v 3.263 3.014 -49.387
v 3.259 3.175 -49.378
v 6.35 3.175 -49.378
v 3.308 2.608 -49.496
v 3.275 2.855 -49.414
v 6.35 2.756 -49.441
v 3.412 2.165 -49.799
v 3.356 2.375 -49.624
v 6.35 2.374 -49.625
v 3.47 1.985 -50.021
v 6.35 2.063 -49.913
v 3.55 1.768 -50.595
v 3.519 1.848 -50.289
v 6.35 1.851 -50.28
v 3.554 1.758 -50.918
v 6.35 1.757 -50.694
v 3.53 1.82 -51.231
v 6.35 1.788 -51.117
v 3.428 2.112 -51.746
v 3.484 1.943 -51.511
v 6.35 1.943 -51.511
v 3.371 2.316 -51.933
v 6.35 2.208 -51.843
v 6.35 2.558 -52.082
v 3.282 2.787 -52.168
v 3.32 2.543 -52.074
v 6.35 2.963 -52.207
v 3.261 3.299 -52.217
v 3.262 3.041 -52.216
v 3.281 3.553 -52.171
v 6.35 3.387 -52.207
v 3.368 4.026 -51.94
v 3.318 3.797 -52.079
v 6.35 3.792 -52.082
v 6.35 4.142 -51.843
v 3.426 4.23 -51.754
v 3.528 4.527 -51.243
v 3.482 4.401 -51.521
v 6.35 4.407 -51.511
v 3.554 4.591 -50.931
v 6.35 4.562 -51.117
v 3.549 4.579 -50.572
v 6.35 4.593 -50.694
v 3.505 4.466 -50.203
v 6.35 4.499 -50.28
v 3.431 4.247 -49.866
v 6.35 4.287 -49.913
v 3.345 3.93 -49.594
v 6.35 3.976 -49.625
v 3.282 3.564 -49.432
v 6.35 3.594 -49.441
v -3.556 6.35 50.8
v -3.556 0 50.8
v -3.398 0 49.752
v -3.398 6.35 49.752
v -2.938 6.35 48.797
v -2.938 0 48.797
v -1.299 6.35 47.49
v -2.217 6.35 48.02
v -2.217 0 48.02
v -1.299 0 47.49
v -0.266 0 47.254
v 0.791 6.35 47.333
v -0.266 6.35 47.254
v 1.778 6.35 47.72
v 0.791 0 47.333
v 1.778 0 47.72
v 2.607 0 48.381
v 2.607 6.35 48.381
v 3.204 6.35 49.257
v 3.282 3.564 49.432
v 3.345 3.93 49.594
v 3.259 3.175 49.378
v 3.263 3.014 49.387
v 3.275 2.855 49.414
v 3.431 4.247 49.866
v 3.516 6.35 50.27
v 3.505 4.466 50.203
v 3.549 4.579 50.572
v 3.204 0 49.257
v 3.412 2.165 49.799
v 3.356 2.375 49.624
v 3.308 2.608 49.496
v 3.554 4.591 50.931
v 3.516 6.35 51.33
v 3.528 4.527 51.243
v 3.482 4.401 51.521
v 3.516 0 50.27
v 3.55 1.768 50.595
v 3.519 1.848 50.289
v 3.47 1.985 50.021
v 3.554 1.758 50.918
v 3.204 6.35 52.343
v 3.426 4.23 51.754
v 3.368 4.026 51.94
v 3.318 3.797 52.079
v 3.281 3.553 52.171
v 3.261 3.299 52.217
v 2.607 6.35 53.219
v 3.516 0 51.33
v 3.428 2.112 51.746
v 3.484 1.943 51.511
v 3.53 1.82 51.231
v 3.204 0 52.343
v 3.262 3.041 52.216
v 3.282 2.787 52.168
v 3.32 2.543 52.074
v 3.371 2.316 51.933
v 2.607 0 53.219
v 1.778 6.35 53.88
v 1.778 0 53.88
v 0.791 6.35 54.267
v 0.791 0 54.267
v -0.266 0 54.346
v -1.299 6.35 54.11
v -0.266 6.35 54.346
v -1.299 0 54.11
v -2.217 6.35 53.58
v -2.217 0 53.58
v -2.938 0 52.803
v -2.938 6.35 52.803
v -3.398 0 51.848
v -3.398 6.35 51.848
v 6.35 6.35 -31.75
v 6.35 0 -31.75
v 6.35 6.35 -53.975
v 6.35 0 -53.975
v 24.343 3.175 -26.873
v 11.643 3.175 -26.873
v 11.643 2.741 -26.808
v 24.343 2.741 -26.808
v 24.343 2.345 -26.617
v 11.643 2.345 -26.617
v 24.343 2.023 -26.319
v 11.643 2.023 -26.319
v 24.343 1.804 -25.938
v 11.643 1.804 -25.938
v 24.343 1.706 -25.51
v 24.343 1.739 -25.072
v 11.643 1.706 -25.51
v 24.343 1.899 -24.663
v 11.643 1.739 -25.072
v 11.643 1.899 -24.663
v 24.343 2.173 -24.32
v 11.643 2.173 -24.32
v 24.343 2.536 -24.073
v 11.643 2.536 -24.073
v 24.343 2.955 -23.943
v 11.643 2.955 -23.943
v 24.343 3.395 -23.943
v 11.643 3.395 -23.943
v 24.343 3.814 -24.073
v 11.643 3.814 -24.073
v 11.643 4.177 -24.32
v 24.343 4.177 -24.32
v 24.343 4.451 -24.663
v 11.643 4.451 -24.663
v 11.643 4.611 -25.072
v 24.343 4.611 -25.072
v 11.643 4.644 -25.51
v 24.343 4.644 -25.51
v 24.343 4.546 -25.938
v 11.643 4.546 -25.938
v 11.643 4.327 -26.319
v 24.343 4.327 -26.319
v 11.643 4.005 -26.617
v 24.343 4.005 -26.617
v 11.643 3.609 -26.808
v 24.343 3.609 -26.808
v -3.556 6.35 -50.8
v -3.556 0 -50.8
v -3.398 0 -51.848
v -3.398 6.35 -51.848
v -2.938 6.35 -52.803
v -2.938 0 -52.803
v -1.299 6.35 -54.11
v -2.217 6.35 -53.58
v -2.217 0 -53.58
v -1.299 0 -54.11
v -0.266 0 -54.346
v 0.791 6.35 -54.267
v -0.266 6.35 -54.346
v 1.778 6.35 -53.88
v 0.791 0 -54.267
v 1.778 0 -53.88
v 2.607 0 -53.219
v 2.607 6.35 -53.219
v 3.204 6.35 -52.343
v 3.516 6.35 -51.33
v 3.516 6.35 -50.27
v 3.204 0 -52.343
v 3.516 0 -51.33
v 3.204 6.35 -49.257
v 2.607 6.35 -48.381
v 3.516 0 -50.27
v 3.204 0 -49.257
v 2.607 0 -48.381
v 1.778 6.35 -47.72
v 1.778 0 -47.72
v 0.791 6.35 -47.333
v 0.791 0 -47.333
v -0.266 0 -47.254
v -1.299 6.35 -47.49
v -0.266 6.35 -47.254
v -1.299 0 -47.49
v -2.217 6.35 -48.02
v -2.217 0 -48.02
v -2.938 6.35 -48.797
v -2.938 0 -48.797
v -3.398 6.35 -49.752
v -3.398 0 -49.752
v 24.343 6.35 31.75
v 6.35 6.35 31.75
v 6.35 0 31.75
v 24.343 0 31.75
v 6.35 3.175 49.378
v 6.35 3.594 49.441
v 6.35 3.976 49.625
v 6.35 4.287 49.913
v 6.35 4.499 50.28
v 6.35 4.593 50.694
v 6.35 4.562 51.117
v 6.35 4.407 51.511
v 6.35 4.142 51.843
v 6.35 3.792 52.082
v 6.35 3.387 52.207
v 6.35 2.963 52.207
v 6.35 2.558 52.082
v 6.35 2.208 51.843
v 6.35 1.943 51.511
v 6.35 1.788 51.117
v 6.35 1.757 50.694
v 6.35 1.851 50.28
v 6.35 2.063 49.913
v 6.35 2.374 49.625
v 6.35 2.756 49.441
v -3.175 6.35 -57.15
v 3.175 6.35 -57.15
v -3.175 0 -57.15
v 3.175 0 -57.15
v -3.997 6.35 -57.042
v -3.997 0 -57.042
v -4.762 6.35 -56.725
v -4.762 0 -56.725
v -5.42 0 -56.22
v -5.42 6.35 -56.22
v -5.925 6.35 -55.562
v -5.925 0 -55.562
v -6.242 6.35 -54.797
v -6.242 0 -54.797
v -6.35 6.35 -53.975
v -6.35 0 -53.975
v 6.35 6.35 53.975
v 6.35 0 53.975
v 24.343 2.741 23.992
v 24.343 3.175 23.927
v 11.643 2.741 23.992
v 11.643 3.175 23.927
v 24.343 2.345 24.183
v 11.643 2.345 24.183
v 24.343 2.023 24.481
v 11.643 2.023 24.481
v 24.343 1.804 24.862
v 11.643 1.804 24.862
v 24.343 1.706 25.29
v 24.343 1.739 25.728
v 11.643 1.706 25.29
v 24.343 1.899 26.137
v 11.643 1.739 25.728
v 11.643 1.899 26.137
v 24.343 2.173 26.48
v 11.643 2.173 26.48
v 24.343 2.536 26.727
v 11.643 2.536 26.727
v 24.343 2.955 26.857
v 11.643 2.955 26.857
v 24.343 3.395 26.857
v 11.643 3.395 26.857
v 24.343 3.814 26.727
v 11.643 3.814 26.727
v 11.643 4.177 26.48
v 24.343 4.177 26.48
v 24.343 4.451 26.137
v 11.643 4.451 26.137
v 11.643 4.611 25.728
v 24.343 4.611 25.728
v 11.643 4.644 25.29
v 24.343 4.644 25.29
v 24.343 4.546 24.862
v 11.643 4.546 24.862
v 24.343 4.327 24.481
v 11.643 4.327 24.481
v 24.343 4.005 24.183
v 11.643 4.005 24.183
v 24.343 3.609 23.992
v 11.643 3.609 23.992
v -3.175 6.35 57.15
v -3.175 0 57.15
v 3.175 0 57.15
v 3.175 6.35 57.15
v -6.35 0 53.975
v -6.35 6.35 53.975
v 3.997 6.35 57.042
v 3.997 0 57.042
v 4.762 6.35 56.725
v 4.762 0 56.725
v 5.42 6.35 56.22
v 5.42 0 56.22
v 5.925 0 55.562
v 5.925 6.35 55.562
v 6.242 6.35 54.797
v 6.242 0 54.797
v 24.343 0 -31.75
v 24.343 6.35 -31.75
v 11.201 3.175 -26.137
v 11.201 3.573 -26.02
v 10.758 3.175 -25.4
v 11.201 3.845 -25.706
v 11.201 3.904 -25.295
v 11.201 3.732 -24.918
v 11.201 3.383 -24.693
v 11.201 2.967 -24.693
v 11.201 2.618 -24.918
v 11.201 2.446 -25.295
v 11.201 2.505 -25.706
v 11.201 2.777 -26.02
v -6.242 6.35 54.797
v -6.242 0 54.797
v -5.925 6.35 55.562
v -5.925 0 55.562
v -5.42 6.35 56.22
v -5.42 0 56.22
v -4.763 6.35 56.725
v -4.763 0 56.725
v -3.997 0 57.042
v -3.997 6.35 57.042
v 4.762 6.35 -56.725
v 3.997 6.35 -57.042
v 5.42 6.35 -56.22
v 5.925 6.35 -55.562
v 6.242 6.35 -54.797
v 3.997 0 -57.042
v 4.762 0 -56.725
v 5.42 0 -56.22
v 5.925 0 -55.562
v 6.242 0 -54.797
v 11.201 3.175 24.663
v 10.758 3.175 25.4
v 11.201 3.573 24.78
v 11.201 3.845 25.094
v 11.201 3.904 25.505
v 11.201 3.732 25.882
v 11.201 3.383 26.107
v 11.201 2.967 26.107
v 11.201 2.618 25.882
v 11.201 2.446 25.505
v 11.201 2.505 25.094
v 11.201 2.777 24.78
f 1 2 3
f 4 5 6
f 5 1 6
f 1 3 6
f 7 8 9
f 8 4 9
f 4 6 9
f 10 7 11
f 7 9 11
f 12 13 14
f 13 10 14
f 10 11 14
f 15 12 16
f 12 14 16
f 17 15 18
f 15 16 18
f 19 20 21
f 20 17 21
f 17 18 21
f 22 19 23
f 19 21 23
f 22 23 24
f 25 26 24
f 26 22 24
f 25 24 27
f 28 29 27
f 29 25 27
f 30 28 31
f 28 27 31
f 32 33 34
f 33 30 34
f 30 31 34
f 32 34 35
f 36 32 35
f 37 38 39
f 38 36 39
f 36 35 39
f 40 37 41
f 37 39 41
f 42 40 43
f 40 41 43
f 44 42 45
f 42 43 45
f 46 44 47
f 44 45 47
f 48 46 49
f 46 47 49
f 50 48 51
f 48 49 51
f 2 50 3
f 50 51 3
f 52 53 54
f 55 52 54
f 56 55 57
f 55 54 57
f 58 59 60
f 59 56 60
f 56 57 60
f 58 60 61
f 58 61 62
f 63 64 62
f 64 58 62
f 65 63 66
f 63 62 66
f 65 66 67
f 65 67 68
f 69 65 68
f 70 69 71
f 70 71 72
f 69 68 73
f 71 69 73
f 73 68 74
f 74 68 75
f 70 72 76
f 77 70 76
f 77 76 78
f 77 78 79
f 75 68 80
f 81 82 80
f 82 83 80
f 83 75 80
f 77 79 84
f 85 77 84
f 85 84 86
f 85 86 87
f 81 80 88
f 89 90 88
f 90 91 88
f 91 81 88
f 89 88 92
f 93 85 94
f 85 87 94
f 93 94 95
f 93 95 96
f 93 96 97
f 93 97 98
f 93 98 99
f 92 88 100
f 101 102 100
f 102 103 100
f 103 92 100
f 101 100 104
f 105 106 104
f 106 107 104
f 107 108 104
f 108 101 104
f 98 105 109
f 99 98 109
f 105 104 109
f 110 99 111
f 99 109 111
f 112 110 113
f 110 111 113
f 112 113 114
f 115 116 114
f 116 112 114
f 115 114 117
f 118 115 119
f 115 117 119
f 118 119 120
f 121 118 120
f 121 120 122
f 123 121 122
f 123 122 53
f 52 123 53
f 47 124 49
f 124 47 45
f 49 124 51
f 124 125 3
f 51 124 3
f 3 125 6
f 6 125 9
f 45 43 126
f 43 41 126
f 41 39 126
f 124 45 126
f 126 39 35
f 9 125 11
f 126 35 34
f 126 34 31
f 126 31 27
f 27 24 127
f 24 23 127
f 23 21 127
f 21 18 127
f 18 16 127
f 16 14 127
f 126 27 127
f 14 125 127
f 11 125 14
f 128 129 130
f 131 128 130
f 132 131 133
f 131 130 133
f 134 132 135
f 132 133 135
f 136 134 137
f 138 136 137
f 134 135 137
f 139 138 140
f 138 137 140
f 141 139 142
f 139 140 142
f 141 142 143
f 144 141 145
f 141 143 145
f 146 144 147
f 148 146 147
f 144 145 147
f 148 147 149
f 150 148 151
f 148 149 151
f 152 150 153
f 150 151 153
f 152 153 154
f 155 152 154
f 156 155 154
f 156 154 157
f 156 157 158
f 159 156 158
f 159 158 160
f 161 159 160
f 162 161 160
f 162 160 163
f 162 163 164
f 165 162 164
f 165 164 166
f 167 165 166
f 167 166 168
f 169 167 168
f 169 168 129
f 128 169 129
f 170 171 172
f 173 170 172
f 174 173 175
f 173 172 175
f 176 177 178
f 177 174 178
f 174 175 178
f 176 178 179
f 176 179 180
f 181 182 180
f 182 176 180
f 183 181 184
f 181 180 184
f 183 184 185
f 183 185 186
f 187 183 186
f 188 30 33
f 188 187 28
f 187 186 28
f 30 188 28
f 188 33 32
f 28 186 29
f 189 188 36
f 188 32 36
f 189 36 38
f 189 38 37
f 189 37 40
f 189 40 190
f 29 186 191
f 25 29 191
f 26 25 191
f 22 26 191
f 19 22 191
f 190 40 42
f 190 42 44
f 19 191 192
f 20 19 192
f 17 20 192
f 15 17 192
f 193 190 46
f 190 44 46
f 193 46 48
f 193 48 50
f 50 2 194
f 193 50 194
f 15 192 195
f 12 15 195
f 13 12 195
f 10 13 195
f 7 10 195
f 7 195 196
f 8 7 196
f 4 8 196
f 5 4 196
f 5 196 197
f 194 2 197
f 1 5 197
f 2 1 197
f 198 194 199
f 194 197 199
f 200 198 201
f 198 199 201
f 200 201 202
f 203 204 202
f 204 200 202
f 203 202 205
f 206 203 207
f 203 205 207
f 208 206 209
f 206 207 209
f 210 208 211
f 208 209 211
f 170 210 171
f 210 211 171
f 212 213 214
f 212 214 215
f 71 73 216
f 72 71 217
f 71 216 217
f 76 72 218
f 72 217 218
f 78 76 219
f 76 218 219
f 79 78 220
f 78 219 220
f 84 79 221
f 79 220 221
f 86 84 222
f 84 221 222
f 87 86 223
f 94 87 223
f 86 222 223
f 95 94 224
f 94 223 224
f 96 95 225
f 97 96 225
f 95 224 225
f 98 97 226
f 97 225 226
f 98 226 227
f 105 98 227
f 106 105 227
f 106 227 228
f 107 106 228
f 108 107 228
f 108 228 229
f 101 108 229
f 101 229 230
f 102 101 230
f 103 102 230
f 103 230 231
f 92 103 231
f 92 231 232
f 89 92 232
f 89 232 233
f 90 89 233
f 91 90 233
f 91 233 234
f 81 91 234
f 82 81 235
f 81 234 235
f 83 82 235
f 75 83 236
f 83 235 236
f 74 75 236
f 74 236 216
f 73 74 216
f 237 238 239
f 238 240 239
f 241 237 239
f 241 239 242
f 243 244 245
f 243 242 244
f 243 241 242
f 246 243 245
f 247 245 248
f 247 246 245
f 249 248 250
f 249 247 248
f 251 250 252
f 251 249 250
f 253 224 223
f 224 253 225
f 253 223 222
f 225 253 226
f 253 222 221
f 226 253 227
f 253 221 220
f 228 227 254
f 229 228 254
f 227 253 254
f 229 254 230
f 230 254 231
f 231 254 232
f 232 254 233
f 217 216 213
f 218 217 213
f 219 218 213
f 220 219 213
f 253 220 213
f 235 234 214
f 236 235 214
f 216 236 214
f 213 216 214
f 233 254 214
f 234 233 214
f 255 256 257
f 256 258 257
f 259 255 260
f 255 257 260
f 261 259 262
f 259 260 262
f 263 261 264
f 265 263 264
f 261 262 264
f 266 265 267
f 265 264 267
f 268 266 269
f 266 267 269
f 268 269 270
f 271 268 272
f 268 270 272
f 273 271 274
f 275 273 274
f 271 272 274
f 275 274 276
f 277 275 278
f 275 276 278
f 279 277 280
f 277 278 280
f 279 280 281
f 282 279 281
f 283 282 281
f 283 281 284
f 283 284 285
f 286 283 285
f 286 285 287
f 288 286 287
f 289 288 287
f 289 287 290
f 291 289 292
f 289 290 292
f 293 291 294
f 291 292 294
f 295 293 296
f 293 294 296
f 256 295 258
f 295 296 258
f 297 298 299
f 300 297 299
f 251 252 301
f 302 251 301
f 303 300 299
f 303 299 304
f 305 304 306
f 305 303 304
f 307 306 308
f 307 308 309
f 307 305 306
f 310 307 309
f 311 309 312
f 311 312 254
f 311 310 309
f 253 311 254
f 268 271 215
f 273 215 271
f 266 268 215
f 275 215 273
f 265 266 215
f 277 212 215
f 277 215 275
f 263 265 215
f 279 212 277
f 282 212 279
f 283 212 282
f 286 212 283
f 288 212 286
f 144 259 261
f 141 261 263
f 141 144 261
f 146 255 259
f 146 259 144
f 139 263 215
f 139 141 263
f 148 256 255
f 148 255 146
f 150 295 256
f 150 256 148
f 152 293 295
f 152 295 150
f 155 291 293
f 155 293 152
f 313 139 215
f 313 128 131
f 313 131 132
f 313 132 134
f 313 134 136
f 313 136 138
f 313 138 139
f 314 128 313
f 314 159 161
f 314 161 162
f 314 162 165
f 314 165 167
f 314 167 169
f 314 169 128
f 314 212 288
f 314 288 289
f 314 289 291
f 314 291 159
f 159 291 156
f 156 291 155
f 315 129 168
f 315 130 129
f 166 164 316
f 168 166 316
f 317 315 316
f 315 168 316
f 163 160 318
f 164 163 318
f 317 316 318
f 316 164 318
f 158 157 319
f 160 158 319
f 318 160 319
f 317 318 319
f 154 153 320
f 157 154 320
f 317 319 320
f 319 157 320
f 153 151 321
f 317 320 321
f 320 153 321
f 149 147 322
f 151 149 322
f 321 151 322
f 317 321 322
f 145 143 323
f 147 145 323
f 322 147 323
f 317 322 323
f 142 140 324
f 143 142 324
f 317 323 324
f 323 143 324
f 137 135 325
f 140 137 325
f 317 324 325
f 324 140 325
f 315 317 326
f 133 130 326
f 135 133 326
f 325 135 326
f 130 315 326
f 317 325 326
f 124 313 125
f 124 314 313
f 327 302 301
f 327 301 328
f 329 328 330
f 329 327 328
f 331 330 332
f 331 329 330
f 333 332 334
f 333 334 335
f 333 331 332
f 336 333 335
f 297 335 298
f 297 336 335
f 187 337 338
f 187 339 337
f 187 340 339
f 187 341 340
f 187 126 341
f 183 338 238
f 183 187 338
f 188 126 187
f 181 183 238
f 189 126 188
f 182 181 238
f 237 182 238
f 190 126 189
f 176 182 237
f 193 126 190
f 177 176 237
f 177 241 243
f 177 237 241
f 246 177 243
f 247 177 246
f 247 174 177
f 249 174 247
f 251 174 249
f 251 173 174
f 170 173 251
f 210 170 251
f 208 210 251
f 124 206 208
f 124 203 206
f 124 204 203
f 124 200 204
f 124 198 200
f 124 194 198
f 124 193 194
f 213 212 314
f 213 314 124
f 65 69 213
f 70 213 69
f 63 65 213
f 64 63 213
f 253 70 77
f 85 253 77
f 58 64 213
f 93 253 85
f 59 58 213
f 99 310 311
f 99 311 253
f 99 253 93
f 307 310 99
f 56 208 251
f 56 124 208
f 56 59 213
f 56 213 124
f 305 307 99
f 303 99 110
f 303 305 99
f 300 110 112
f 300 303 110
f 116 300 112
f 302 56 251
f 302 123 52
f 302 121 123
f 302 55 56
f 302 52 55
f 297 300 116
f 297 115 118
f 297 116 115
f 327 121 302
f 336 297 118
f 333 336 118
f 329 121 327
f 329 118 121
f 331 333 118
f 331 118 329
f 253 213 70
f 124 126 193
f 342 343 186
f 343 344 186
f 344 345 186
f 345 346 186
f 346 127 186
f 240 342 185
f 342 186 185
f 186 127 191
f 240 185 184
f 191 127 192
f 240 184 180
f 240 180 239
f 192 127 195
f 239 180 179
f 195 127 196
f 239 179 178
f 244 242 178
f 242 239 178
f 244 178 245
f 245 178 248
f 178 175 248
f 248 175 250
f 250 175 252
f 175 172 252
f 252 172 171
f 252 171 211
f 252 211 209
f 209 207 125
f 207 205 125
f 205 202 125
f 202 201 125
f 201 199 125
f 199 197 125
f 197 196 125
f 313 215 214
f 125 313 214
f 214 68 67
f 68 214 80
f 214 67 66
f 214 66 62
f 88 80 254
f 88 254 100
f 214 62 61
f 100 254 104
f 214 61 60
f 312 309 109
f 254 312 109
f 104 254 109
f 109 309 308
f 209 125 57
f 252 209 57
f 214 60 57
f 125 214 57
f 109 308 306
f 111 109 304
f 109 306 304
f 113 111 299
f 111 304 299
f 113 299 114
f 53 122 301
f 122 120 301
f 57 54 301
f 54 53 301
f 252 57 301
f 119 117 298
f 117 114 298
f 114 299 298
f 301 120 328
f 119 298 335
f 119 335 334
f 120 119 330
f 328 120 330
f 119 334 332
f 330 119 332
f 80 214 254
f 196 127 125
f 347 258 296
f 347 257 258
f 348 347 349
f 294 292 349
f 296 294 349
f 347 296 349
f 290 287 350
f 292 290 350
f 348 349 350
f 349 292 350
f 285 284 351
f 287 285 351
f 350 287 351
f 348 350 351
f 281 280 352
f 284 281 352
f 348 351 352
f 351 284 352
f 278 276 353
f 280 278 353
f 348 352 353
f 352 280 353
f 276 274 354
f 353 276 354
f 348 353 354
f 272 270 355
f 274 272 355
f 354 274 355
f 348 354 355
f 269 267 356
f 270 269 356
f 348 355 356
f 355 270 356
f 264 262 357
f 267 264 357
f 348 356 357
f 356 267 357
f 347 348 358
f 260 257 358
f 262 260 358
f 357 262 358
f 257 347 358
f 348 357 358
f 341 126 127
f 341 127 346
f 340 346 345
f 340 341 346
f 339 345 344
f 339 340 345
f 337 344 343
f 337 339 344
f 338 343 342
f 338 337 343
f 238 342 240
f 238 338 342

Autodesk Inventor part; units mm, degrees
sketch "Sketch1" plane through (0, 0, 0) normal (0, 1, 0) x (-1, 0, 0)
  line L0 (6.35, 57.15) -> (-6.35, 57.15)
  line L1 (-6.35, 57.15) -> (-6.35, -57.15)
  line L2 (-6.35, -57.15) -> (6.35, -57.15)
  line L3 (6.35, -57.15) -> (6.35, 57.15)
  circle A0 centre (0, 50.8) radius 3.556
  circle A1 centre (0, -50.8) radius 3.556
  point P0 (0, 0)
  dimension "d0" = 12.7
  dimension "d2" = 57.15
  dimension "d3" = 114.3
  dimension "d4" = 101.6
  dimension "d5" = 50.8
  dimension "d25" = 7.112
  dimension "d26" = 7.112
extrude "Extrusion1" add sketch "Sketch1" along normal blind 6.35
sketch "Sketch2" plane through (0, 0, 0) normal (0, -1, 0) x (1, 0, 0)
  circle A0 centre (0, -50.8) radius 3.556 projected
  circle A1 centre (0, 50.8) radius 3.556 projected
  point P0 (0, 0)
extrude "Extrusion2" [suppressed]
sketch "Sketch4" plane through (0, 6.35, 0) normal (0, 1, 0) x (1, 0, 0)
  circle A0 centre (-19.05, 15.1999) radius 3
  line L0 (-20.7085, 12.7) -> (-17.3915, 12.7)
  line L1 (-31.75, 12.7) -> (-6.35, 12.7) projected
  line L2 (-6.35, 57.15) -> (-6.35, -57.15) projected
  arc A1 (-16.521, 12.7) -> (-21.579, 12.7) centre (-19.05, 15.1999) ccw
  line L3 (-31.75, 12.7) -> (-6.35, 12.7) projected
  line L4 (-21.579, 12.7) -> (-20.7085, 12.7)
  line L5 (-17.3915, 12.7) -> (-16.521, 12.7)
  point P0 (0, 0)
  dimension "d18" = 6
  dimension "d19" = 3.317
  dimension "d20" = 0
  dimension "d21" = 12.7
  dimension "d22" = 7.112
extrude "Extrusion4" [suppressed]
mirror "Mirror1" [suppressed]
sketch "Sketch6" plane through (0, 0, 0) normal (0, -1, 0) x (1, 0, 0)
  line L0 (-6.35, 57.15) -> (6.35, 57.15) projected
  line L1 (6.35, 57.15) -> (12.7, 57.15)
  line L2 (12.7, 57.15) -> (12.7, -57.15)
  line L3 (12.7, -57.15) -> (6.35, -57.15)
  line L4 (6.35, -57.15) -> (6.35, 57.15)
  line L5 (6.35, -57.15) -> (-6.35, -57.15) projected
  point P0 (0, 0)
  dimension "d44" = 114.3
  dimension "d45" = 114.3
  dimension "d48" = 6.35
extrude "Extrusion6" [suppressed]
ref_plane "Work Plane2" through (12.7, 0, 41.275) normal (1, 0, 0) x (0, 0, -1)
ref_plane "Work Plane3" through (14.2875, 0, 41.275) normal (1, 0, 0) x (0, 0, -1)
ref_plane "Work Plane1" through (12.7, 0, 41.275) normal (1, 0, 0) x (0, 0, -1)
ref_plane "Work Plane4" through (12.7, 3.175, 41.275) normal (0, 1, 0) x (1, 0, 0)
sketch "Sketch11" plane through (0, 6.35, 0) normal (0, 1, 0) x (1, 0, 0)
  circle A0 centre (0, 50.8) radius 3.556 projected
  line L0 (6.35, 57.15) -> (-6.35, 57.15) projected
  circle A1 centre (0, -48.895) radius 3.556 projected
  point P0 (0, 0)
  dimension "d70" = 6.35
  dimension "d71" = 7.112
  dimension "d72" = 97.79
sketch "Sketch12" plane through (0, 0, 0) normal (0, -1, 0) x (1, 0, 0)
  circle A0 centre (0, 50.8) radius 3.556 projected
  circle A1 centre (0, -50.8) radius 3.556 projected
  circle A2 centre (0, -50.8) radius 1.651
  circle A3 centre (0, 50.8) radius 1.651
  point P0 (0, 0)
  dimension "d73" = 3.302
  dimension "d74" = 3.302
extrude "Extrusion11" [suppressed]
sketch "Sketch14" plane through (6.35, 0, 57.15) normal (1, 0, 0) x (0, 0, -1)
  circle A0 centre (6.35, 3.175) radius 1.4224
  line L0 (2.794, 6.35) -> (9.906, 6.35) projected
  line L1 (104.394, 6.35) -> (111.506, 6.35) projected
  line L2 (0, 0) -> (114.3, 0) projected
  point P0 (57.15, 0)
  point P1 (2.159, 1.27)
  point P2 (9.271, 1.27)
  point P3 (99.949, 1.27)
  point P4 (107.061, 1.27)
  dimension "d87" = 2.8448
  dimension "d99" = 3.175
  dimension "d100" = 6.35
  dimension "d101" = 7.112
  dimension "d102" = 3.556
extrude "Extrusion13" cut sketch "Sketch14" against normal up to next
thread "Thread3" size "5-40 UNC" class "2B" standard "ANSI Unified Screw Threads" full length
mirror "Mirror3" about plane through (0, 0, 0) normal (0, 0, 1) of "Extrusion13"
thread "Thread4" size "5-40 UNC" class "2B" standard "ANSI Unified Screw Threads" full length
fillet "Fillet1" radius 3.175 4 edges at (6.35, 3.175, 57.15) (-6.35, 3.175, 57.15) (6.35, 3.175, -57.15) (-6.35, 3.175, -57.15)
sketch "Sketch15" plane through (0, 6.35, 0) normal (0, 1, 0) x (1, 0, 0)
  line L0 (6.35, -53.975) -> (6.35, 53.975) projected
  line L1 (6.35, -31.75) -> (24.3434, -31.75)
  line L2 (24.3434, -31.75) -> (24.3434, 31.75)
  line L3 (24.3434, 31.75) -> (6.35, 31.75)
  line L4 (6.35, 31.75) -> (6.35, -31.75)
  point P0 (0, 0)
  dimension "d103" = 63.5
  dimension "d104" = 31.75
  dimension "d105" = 17.9934
extrude "Extrusion14" add sketch "Sketch15" against normal up to surface (6.35 mm away)
sketch "Sketch16" plane through (24.3434, 6.35, 31.75) normal (1, 0, 0) x (0, 0, -1)
  line L0 (0, 0) -> (0, -6.35) projected
  line L1 (0, 0) -> (63.5, 0) projected
  line L2 (0, -6.35) -> (63.5, -6.35) projected
  line L3 (31.75, -6.35) -> (31.75, 0)
  line L4 (85.725, 0) -> (-22.225, 0) projected
  point P0 (6.35, -3.175)
  point P1 (57.15, -3.175)
  dimension "d112" = 6.35
  dimension "d114" = 3.175
  dimension "d126" = 50.8
  dimension "d128" = 25.4
hole "Hole1" at (24.3434, 3.175, 25.4) at (24.3434, 3.175, -25.4) direction (-1, 0, 0) diameter 2.9464 depth 12.7 tip angle 118
thread "Thread5" size "5-40 UNC" class "2B" standard "ANSI Unified Screw Threads" full length
thread "Thread6" size "5-40 UNC" class "2B" standard "ANSI Unified Screw Threads" full length
equation "\"d2\" = 0.5 * d3"
equation "\"d5\" = 0.5 * d4"
equation "\"d26\" = d25"
equation "\"d45\" = d44"
equation "\"d74\" = d73"
equation "\"d99\" = 0.5 * d100"
equation "\"d102\" = 0.5 * d101"
equation "\"d104\" = 0.5 * d103"
equation "\"d114\" = 0.5 * d112"
properties part number "Slide rod connector" material "Aluminum 6061"
